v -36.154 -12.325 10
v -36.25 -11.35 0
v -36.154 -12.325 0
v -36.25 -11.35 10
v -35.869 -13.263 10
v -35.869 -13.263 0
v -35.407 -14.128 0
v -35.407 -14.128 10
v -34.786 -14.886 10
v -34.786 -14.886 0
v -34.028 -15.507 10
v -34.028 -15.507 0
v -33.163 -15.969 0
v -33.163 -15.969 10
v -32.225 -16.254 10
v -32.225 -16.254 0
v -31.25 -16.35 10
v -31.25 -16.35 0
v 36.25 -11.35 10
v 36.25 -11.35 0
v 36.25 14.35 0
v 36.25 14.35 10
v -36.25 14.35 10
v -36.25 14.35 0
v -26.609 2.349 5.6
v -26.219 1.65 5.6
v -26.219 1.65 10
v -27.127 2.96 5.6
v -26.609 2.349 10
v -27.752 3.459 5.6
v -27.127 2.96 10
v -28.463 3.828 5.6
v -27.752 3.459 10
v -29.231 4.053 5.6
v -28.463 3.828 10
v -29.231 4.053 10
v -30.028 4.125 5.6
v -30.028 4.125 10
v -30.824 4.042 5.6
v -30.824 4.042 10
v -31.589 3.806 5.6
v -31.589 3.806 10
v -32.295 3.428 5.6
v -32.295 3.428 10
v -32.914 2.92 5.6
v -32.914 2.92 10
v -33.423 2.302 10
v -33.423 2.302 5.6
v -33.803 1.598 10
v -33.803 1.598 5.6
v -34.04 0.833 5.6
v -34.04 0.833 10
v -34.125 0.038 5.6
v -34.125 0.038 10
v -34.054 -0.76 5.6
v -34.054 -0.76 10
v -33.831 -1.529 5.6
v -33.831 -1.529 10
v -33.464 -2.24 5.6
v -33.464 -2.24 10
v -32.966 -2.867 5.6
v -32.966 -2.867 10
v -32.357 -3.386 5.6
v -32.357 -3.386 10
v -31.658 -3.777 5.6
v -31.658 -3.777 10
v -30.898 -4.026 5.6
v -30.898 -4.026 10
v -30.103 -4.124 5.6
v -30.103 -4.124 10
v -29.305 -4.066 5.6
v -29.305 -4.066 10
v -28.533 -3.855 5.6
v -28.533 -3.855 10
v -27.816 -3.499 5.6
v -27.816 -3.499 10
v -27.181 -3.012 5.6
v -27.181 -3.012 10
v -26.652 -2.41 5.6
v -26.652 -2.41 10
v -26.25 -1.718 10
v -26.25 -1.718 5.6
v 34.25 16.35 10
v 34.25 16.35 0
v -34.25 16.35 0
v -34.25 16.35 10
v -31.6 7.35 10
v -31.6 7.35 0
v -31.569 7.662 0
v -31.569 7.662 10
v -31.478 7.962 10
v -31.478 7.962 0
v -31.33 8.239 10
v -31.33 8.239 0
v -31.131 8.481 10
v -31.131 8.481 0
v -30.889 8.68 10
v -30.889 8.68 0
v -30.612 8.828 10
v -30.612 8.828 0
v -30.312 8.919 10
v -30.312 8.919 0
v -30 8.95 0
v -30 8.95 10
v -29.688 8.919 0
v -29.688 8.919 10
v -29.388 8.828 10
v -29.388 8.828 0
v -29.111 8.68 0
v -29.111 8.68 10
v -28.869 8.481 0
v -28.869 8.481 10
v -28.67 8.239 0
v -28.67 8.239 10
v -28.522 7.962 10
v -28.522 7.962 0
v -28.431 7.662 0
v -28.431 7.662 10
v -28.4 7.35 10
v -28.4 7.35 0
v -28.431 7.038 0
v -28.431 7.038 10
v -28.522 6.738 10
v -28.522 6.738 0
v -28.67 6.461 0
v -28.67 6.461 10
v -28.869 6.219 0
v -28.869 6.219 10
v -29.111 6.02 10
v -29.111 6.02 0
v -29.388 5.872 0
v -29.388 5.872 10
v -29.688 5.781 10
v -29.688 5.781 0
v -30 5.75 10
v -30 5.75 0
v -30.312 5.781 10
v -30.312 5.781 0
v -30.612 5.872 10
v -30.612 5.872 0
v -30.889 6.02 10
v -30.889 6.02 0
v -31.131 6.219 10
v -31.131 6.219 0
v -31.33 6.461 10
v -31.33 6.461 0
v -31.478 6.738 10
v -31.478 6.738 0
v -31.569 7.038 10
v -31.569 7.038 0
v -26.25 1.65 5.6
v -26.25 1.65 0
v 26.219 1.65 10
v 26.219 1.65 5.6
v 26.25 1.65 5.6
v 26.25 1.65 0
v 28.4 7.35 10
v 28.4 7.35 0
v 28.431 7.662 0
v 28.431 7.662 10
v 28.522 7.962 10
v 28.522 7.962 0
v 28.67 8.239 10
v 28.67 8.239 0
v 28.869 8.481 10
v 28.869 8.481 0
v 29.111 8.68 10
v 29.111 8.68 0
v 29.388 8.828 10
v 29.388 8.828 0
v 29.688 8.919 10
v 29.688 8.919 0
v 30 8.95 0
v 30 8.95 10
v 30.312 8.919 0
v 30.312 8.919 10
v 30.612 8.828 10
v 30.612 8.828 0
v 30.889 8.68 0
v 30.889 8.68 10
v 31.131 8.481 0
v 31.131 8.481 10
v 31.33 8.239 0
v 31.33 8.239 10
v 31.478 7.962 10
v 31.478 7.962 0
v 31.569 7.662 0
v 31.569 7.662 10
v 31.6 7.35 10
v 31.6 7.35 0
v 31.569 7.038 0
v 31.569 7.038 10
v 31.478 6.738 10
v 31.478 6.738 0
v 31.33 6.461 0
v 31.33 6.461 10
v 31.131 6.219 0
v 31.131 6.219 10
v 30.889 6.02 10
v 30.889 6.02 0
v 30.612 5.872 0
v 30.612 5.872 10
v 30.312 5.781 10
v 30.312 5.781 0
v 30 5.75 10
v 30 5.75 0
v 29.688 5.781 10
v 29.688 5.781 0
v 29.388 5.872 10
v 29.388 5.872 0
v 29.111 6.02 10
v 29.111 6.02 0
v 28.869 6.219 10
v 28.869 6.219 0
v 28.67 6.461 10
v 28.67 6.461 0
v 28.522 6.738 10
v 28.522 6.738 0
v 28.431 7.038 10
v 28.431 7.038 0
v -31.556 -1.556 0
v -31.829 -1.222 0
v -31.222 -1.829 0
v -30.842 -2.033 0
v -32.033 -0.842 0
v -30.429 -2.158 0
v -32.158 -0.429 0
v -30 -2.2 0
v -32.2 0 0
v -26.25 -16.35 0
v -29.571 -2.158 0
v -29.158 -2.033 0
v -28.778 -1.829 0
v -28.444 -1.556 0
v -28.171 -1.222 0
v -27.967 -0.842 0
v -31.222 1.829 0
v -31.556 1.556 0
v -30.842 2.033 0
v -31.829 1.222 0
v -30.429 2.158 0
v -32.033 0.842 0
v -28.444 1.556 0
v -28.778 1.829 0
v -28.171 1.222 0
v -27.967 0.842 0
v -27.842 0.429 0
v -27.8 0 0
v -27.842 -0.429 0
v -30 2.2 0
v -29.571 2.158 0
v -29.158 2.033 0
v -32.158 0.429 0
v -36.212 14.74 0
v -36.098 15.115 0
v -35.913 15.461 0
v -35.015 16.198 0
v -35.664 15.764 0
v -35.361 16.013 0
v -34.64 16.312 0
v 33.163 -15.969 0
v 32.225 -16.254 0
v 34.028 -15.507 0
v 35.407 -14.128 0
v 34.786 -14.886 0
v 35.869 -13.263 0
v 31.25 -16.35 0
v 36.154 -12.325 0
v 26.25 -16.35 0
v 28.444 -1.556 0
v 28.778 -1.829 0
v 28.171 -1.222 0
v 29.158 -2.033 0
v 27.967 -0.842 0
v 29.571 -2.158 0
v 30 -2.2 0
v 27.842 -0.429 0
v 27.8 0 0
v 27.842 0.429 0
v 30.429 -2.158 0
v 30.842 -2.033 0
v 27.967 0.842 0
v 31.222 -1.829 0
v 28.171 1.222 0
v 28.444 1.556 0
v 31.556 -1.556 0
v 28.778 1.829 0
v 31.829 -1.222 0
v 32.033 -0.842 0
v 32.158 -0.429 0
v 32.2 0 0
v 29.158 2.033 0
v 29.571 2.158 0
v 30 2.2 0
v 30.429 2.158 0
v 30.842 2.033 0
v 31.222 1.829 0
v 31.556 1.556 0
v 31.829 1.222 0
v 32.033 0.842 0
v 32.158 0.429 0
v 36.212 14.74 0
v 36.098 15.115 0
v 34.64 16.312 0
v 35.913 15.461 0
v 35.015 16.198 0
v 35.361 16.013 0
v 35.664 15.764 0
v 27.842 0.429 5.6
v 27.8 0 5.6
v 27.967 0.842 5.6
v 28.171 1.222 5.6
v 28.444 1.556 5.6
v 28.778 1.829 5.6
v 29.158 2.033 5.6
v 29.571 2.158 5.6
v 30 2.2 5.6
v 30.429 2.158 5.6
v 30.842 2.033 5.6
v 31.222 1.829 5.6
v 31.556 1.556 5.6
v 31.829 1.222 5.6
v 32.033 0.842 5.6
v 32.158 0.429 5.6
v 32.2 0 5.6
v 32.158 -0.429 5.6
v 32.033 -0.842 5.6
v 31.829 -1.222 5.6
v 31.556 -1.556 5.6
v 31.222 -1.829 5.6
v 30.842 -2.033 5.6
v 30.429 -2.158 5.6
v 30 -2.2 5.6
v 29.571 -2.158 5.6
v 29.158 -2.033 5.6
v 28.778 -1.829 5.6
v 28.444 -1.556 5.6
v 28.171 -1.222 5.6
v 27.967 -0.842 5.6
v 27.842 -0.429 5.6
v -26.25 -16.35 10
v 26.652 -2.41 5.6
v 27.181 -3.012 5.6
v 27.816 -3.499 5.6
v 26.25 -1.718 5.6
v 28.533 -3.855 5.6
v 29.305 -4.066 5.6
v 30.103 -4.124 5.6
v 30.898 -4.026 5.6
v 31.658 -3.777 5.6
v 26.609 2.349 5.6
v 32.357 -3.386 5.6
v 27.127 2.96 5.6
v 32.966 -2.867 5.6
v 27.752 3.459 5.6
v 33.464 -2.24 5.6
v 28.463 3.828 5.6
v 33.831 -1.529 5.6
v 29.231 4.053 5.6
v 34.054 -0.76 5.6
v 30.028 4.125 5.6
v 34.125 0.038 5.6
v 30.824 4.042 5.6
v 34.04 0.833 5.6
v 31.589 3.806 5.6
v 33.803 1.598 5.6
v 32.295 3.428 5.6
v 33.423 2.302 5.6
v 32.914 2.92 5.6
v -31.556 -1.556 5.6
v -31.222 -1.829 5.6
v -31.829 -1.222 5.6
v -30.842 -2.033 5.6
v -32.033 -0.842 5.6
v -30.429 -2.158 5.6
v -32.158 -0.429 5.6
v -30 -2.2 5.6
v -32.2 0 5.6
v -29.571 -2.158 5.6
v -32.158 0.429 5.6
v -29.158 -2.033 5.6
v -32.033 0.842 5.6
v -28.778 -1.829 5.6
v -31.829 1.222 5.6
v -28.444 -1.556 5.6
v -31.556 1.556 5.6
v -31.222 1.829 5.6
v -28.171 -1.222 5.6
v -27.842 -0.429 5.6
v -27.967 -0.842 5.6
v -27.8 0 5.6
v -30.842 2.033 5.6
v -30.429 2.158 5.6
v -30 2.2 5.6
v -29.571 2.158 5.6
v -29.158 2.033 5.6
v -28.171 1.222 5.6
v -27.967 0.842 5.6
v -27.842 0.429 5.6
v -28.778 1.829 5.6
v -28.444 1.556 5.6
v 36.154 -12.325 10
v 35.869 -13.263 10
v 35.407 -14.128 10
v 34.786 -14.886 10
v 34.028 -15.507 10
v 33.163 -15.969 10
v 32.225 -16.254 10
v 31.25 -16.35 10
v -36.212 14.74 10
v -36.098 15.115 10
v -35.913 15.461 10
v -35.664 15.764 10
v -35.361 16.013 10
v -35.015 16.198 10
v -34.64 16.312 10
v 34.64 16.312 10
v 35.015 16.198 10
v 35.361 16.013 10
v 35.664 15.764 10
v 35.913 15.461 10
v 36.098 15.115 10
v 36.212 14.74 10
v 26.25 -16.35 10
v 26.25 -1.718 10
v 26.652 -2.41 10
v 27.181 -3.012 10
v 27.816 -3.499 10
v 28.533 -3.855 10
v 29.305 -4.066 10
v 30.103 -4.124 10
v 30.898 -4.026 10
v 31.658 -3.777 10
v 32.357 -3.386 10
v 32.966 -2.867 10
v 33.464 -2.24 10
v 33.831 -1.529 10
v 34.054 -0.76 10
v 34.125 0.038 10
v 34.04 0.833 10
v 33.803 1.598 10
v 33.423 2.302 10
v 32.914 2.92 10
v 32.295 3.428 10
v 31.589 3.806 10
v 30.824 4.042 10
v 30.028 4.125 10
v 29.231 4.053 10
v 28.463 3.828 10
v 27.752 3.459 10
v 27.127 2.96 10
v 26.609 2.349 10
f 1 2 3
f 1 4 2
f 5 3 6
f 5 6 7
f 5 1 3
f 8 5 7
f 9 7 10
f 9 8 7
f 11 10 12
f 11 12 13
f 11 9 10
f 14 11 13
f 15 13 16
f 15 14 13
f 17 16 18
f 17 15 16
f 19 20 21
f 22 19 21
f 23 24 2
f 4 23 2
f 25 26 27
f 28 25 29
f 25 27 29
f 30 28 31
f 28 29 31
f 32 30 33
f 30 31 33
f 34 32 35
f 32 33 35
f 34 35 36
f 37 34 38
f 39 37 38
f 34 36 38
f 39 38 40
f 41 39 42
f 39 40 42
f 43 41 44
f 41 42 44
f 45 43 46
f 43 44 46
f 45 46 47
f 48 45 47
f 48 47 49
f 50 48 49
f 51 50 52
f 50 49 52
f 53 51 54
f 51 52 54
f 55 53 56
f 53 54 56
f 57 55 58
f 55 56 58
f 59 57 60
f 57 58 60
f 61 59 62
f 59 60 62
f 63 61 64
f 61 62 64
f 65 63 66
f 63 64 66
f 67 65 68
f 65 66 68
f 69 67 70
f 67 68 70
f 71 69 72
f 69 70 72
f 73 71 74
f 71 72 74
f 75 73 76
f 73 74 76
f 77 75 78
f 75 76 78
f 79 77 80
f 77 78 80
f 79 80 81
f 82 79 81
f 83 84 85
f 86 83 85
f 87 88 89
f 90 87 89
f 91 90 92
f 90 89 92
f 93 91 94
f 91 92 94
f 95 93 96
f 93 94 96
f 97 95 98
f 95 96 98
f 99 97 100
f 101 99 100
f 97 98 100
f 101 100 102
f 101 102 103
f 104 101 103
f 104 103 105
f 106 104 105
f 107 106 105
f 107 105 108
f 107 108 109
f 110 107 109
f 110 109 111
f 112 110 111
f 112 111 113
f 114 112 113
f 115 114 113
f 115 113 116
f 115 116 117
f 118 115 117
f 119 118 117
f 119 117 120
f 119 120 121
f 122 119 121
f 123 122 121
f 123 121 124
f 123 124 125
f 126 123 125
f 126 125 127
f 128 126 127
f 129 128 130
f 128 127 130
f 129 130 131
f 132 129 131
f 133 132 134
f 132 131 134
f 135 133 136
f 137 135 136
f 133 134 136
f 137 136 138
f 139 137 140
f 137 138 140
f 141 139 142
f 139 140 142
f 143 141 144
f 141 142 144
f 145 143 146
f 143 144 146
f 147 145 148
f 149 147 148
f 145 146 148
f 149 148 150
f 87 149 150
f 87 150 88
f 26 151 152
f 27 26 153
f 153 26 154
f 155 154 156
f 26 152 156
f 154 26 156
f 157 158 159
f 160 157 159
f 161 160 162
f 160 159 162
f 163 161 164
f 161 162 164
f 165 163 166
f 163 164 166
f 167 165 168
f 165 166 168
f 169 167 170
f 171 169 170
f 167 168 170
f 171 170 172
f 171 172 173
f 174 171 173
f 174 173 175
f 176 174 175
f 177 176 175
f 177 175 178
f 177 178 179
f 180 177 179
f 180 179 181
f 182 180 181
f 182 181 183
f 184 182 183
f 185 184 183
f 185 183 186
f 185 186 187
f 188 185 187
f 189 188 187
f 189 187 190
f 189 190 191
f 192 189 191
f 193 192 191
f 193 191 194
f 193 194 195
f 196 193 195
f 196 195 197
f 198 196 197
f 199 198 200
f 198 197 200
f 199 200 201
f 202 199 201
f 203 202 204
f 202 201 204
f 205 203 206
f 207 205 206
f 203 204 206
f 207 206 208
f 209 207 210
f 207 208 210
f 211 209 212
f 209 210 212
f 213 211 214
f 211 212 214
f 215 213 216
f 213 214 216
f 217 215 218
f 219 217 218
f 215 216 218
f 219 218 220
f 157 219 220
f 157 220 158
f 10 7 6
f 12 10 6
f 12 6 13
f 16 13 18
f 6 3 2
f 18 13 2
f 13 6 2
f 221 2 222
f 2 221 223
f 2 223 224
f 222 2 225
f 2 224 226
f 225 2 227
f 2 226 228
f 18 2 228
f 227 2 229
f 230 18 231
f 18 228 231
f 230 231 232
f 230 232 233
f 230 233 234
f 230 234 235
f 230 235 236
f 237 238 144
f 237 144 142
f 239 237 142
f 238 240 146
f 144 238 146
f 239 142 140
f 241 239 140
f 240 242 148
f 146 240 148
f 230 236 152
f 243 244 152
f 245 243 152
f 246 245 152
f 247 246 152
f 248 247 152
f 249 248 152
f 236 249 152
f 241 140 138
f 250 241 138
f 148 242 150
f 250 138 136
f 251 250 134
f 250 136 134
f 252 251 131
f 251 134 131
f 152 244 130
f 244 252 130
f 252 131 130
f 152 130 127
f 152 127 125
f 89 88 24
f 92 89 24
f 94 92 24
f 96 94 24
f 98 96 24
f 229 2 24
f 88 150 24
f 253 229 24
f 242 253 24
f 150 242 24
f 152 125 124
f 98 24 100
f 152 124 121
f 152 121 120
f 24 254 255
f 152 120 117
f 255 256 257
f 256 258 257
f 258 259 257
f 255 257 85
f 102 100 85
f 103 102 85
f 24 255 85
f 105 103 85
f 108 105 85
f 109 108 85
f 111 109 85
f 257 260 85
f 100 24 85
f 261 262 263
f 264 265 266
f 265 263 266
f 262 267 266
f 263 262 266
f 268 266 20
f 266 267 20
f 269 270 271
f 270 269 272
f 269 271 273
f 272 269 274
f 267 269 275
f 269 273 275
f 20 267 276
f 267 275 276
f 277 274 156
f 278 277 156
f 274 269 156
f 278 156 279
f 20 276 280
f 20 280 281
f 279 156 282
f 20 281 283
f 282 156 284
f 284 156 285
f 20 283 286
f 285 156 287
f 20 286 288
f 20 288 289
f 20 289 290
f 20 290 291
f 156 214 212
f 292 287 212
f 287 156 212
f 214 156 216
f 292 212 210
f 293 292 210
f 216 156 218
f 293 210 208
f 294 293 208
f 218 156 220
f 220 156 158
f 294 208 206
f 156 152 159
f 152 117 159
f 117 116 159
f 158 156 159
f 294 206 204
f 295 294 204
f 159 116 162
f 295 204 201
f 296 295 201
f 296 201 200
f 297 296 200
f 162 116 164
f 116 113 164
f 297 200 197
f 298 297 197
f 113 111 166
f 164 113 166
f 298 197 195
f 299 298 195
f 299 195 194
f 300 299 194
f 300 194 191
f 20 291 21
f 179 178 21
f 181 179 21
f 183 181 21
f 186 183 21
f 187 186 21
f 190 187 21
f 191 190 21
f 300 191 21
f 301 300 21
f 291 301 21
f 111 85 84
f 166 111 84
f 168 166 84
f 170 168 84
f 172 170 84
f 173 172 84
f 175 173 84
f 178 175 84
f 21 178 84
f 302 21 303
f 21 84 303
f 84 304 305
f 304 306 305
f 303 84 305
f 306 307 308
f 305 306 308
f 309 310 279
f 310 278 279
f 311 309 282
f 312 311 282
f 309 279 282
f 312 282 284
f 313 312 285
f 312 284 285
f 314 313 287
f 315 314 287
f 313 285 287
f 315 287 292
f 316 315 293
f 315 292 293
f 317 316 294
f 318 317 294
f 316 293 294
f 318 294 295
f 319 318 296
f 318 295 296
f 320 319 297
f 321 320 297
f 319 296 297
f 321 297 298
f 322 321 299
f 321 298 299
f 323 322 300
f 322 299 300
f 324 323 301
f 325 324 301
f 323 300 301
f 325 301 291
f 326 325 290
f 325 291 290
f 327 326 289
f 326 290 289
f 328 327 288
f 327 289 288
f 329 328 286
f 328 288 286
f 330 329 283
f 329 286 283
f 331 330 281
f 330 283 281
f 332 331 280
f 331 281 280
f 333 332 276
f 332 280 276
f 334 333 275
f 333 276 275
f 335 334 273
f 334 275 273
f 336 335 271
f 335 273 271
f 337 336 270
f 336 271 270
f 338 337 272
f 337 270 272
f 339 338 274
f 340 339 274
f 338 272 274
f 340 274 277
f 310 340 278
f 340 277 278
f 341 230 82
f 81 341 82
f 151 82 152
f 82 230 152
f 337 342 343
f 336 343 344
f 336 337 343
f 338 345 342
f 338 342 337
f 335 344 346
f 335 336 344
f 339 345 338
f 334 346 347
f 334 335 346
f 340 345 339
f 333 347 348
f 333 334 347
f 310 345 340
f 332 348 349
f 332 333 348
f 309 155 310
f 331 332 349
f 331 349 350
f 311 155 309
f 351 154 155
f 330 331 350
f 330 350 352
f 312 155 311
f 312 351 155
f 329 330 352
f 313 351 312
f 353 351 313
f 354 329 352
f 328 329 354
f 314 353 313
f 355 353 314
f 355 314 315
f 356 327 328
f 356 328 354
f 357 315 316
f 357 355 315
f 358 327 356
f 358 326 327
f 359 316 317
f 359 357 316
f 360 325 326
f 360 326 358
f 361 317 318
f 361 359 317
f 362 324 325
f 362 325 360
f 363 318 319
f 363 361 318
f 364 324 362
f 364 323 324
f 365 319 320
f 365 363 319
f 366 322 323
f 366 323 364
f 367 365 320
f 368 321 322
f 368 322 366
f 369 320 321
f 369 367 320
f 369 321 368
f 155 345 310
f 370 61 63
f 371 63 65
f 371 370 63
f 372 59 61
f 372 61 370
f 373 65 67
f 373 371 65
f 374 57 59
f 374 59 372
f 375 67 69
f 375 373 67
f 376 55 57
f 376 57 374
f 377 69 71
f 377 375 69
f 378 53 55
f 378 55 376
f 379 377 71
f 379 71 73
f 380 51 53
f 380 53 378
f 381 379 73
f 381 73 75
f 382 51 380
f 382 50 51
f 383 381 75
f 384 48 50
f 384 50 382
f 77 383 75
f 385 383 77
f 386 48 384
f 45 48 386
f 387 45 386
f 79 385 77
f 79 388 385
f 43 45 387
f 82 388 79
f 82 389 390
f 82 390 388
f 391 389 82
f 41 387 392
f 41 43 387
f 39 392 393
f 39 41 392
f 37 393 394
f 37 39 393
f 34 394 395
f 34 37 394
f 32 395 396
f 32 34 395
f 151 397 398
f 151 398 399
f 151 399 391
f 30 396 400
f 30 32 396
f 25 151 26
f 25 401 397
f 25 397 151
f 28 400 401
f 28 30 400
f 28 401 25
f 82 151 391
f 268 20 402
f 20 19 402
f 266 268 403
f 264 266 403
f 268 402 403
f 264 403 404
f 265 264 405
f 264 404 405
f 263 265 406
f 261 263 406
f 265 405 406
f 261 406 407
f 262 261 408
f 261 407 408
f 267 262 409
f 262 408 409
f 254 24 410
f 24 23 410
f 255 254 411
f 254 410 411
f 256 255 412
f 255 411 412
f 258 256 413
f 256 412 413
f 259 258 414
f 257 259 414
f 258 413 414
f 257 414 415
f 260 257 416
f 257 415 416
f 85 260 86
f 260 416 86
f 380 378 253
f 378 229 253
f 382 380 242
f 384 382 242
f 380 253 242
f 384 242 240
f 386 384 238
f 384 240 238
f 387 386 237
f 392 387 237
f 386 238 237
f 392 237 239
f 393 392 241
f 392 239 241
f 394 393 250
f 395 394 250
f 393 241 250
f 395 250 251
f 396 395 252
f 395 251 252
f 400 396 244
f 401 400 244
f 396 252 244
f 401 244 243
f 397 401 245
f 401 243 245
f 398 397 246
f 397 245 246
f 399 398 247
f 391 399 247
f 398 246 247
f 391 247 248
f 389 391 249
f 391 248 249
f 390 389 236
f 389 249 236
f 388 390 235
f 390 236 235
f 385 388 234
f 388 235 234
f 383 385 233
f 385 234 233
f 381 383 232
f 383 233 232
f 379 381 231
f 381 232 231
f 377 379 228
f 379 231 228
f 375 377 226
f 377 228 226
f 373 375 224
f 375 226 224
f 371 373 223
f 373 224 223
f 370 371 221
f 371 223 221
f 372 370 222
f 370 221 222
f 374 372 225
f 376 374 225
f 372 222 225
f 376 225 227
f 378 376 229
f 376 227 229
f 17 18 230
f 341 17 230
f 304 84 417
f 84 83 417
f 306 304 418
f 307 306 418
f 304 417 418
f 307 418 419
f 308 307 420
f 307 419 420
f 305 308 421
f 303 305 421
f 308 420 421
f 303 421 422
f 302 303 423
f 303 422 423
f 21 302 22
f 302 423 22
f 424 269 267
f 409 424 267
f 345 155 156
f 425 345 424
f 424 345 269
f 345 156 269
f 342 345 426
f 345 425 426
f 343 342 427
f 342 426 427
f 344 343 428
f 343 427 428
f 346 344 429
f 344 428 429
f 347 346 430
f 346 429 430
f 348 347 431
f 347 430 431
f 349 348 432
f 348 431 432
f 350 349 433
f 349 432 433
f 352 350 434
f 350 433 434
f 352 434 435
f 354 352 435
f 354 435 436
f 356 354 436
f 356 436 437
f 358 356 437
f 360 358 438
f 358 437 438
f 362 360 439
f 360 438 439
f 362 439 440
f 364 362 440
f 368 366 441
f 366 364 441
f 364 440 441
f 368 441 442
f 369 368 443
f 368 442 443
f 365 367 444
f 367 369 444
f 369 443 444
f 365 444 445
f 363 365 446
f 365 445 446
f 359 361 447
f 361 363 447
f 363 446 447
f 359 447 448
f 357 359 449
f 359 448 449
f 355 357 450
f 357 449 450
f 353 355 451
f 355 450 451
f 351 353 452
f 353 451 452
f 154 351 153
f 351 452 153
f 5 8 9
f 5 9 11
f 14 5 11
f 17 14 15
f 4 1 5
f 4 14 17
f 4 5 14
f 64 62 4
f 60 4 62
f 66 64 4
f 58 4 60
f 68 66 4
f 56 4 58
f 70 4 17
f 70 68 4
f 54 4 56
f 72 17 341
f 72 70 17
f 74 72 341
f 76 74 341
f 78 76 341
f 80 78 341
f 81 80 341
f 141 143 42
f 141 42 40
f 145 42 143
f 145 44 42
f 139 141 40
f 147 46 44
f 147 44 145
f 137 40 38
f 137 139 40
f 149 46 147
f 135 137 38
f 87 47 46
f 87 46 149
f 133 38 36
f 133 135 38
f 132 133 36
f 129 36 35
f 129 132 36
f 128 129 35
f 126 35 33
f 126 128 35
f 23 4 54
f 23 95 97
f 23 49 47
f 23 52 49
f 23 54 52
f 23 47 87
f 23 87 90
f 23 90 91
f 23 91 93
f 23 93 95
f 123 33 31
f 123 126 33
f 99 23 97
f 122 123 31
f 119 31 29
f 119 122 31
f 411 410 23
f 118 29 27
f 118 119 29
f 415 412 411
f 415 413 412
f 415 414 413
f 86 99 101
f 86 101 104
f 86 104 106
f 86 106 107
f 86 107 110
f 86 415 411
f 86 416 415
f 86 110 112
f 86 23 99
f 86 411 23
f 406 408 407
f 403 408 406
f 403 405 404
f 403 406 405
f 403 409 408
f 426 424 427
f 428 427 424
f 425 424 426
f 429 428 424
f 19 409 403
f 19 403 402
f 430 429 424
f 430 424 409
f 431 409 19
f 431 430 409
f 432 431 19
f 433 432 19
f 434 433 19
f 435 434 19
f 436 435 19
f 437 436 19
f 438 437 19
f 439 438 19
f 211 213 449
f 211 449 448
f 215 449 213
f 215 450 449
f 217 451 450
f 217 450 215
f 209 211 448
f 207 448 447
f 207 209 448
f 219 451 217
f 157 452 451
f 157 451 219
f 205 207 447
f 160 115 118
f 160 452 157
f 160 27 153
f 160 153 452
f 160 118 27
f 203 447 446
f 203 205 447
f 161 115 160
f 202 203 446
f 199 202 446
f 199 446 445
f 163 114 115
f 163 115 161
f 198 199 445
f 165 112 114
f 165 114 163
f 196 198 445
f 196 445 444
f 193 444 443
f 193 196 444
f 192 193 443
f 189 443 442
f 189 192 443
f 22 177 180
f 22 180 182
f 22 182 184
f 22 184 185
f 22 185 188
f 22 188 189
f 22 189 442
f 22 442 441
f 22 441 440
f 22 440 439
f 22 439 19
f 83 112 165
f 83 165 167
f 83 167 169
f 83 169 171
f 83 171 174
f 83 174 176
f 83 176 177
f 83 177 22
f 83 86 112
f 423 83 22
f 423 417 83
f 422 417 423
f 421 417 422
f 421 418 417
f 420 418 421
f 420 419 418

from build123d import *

# Parameters (mm, degrees)
F1_DEPTH       = 10
F3_D           = 3.2
F3_DEPTH       = 14.25
F3_TIP         = 0.9613769904
F4_R           = 5
F5_R           = 2
F7_D           = 4.4
F7_CBORE_D     = 8.25
F7_CBORE_DEPTH = 4.4


with BuildPart() as f1:
    # F0 (on Top) → F1 (new body)
    with BuildSketch(Plane.XY):
        Polygon((-36.25, 16.35), (-36.25, -16.35), (-26.25, -16.35), (-26.25, 1.65), (26.25, 1.65), (26.25, -16.35), (36.25, -16.35), (36.25, 16.35), align=None)
    extrude(amount=F1_DEPTH)

    # F3
    with Locations(Plane.XY.offset(10)):
        with Locations((-30, 7.35), (30, 7.35)):
            Hole(F3_D / 2, depth=F3_DEPTH)
            with Locations((0, 0, -(F3_DEPTH + F3_TIP / 2))):  # 118° drill point
                Cone(0, F3_D / 2, F3_TIP, mode=Mode.SUBTRACT)

    # F4
    f4_edges = [f1.edges().sort_by_distance(p)[0] for p in [
        (-36.25, -16.35, 5),
        (36.25, -16.35, 5),
    ]]
    fillet(f4_edges, radius=F4_R)

    # F5
    f5_edges = [f1.edges().sort_by_distance(p)[0] for p in [
        (36.25, 16.35, 5),
        (-36.25, 16.35, 5),
    ]]
    fillet(f5_edges, radius=F5_R)

    # F7 (through all)
    with Locations(Plane.XY.offset(10)):
        with Locations((-30, 0), (30, 0)):
            CounterBoreHole(F7_D / 2, F7_CBORE_D / 2, F7_CBORE_DEPTH)


solid = f1.part
